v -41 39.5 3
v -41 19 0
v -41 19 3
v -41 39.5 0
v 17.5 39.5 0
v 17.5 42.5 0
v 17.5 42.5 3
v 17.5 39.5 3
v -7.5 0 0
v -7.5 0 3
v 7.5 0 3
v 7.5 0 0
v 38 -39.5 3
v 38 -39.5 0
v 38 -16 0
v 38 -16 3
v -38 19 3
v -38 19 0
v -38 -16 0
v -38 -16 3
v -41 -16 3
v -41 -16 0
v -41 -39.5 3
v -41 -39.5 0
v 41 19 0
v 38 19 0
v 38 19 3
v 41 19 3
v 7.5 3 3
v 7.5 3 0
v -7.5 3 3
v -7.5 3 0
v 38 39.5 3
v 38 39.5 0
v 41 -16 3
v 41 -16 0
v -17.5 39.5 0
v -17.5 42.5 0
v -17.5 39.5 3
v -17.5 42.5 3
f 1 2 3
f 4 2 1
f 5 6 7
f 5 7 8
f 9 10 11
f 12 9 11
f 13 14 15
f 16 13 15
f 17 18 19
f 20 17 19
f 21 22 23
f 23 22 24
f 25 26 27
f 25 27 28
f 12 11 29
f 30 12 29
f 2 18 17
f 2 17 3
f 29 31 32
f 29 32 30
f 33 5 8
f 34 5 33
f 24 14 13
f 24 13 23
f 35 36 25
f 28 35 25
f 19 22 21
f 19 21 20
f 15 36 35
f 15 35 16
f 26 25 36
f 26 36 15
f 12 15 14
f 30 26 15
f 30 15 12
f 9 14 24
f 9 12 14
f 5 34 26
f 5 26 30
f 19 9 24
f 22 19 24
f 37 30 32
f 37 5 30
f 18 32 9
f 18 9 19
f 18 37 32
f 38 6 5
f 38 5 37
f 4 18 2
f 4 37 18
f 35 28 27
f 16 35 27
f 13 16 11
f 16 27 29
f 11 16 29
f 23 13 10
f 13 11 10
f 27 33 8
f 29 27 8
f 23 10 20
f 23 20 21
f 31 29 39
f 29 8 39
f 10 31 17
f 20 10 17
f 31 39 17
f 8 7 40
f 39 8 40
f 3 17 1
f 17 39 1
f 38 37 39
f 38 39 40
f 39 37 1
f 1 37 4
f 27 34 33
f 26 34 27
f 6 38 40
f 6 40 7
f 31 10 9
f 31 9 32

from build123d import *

# Parameters (mm, degrees)
BOSS_EXTRUDE1_DEPTH = 3
SKETCH2_W           = 15
SKETCH2_H           = 3
CUT_EXTRUDE1_DEPTH  = 3


with BuildPart() as part:
    # Sketch1 → Boss-Extrude1 (new body)
    with BuildSketch(Plane.XY):
        Polygon((-38, 39.5), (-17.5, 39.5), (-17.5, 42.5), (17.5, 42.5), (17.5, 39.5), (38, 39.5), (38, 19), (41, 19), (41, 16), (41, -16), (38, -16), (38, -19), (38, -39.5), (-41, -39.5), (-41, -19), (-41, -16), (-38, -16), (-38, 16), (-38, 19), (-41, 19), (-41, 39.5), align=None)
    extrude(amount=BOSS_EXTRUDE1_DEPTH)

    # Sketch2 → Cut-Extrude1 (cut)
    with BuildSketch(Plane.XY.offset(3)):
        with Locations((0, 1.5)):
            Rectangle(SKETCH2_W, SKETCH2_H)
    extrude(amount=-CUT_EXTRUDE1_DEPTH, mode=Mode.SUBTRACT)


solid = part.part
